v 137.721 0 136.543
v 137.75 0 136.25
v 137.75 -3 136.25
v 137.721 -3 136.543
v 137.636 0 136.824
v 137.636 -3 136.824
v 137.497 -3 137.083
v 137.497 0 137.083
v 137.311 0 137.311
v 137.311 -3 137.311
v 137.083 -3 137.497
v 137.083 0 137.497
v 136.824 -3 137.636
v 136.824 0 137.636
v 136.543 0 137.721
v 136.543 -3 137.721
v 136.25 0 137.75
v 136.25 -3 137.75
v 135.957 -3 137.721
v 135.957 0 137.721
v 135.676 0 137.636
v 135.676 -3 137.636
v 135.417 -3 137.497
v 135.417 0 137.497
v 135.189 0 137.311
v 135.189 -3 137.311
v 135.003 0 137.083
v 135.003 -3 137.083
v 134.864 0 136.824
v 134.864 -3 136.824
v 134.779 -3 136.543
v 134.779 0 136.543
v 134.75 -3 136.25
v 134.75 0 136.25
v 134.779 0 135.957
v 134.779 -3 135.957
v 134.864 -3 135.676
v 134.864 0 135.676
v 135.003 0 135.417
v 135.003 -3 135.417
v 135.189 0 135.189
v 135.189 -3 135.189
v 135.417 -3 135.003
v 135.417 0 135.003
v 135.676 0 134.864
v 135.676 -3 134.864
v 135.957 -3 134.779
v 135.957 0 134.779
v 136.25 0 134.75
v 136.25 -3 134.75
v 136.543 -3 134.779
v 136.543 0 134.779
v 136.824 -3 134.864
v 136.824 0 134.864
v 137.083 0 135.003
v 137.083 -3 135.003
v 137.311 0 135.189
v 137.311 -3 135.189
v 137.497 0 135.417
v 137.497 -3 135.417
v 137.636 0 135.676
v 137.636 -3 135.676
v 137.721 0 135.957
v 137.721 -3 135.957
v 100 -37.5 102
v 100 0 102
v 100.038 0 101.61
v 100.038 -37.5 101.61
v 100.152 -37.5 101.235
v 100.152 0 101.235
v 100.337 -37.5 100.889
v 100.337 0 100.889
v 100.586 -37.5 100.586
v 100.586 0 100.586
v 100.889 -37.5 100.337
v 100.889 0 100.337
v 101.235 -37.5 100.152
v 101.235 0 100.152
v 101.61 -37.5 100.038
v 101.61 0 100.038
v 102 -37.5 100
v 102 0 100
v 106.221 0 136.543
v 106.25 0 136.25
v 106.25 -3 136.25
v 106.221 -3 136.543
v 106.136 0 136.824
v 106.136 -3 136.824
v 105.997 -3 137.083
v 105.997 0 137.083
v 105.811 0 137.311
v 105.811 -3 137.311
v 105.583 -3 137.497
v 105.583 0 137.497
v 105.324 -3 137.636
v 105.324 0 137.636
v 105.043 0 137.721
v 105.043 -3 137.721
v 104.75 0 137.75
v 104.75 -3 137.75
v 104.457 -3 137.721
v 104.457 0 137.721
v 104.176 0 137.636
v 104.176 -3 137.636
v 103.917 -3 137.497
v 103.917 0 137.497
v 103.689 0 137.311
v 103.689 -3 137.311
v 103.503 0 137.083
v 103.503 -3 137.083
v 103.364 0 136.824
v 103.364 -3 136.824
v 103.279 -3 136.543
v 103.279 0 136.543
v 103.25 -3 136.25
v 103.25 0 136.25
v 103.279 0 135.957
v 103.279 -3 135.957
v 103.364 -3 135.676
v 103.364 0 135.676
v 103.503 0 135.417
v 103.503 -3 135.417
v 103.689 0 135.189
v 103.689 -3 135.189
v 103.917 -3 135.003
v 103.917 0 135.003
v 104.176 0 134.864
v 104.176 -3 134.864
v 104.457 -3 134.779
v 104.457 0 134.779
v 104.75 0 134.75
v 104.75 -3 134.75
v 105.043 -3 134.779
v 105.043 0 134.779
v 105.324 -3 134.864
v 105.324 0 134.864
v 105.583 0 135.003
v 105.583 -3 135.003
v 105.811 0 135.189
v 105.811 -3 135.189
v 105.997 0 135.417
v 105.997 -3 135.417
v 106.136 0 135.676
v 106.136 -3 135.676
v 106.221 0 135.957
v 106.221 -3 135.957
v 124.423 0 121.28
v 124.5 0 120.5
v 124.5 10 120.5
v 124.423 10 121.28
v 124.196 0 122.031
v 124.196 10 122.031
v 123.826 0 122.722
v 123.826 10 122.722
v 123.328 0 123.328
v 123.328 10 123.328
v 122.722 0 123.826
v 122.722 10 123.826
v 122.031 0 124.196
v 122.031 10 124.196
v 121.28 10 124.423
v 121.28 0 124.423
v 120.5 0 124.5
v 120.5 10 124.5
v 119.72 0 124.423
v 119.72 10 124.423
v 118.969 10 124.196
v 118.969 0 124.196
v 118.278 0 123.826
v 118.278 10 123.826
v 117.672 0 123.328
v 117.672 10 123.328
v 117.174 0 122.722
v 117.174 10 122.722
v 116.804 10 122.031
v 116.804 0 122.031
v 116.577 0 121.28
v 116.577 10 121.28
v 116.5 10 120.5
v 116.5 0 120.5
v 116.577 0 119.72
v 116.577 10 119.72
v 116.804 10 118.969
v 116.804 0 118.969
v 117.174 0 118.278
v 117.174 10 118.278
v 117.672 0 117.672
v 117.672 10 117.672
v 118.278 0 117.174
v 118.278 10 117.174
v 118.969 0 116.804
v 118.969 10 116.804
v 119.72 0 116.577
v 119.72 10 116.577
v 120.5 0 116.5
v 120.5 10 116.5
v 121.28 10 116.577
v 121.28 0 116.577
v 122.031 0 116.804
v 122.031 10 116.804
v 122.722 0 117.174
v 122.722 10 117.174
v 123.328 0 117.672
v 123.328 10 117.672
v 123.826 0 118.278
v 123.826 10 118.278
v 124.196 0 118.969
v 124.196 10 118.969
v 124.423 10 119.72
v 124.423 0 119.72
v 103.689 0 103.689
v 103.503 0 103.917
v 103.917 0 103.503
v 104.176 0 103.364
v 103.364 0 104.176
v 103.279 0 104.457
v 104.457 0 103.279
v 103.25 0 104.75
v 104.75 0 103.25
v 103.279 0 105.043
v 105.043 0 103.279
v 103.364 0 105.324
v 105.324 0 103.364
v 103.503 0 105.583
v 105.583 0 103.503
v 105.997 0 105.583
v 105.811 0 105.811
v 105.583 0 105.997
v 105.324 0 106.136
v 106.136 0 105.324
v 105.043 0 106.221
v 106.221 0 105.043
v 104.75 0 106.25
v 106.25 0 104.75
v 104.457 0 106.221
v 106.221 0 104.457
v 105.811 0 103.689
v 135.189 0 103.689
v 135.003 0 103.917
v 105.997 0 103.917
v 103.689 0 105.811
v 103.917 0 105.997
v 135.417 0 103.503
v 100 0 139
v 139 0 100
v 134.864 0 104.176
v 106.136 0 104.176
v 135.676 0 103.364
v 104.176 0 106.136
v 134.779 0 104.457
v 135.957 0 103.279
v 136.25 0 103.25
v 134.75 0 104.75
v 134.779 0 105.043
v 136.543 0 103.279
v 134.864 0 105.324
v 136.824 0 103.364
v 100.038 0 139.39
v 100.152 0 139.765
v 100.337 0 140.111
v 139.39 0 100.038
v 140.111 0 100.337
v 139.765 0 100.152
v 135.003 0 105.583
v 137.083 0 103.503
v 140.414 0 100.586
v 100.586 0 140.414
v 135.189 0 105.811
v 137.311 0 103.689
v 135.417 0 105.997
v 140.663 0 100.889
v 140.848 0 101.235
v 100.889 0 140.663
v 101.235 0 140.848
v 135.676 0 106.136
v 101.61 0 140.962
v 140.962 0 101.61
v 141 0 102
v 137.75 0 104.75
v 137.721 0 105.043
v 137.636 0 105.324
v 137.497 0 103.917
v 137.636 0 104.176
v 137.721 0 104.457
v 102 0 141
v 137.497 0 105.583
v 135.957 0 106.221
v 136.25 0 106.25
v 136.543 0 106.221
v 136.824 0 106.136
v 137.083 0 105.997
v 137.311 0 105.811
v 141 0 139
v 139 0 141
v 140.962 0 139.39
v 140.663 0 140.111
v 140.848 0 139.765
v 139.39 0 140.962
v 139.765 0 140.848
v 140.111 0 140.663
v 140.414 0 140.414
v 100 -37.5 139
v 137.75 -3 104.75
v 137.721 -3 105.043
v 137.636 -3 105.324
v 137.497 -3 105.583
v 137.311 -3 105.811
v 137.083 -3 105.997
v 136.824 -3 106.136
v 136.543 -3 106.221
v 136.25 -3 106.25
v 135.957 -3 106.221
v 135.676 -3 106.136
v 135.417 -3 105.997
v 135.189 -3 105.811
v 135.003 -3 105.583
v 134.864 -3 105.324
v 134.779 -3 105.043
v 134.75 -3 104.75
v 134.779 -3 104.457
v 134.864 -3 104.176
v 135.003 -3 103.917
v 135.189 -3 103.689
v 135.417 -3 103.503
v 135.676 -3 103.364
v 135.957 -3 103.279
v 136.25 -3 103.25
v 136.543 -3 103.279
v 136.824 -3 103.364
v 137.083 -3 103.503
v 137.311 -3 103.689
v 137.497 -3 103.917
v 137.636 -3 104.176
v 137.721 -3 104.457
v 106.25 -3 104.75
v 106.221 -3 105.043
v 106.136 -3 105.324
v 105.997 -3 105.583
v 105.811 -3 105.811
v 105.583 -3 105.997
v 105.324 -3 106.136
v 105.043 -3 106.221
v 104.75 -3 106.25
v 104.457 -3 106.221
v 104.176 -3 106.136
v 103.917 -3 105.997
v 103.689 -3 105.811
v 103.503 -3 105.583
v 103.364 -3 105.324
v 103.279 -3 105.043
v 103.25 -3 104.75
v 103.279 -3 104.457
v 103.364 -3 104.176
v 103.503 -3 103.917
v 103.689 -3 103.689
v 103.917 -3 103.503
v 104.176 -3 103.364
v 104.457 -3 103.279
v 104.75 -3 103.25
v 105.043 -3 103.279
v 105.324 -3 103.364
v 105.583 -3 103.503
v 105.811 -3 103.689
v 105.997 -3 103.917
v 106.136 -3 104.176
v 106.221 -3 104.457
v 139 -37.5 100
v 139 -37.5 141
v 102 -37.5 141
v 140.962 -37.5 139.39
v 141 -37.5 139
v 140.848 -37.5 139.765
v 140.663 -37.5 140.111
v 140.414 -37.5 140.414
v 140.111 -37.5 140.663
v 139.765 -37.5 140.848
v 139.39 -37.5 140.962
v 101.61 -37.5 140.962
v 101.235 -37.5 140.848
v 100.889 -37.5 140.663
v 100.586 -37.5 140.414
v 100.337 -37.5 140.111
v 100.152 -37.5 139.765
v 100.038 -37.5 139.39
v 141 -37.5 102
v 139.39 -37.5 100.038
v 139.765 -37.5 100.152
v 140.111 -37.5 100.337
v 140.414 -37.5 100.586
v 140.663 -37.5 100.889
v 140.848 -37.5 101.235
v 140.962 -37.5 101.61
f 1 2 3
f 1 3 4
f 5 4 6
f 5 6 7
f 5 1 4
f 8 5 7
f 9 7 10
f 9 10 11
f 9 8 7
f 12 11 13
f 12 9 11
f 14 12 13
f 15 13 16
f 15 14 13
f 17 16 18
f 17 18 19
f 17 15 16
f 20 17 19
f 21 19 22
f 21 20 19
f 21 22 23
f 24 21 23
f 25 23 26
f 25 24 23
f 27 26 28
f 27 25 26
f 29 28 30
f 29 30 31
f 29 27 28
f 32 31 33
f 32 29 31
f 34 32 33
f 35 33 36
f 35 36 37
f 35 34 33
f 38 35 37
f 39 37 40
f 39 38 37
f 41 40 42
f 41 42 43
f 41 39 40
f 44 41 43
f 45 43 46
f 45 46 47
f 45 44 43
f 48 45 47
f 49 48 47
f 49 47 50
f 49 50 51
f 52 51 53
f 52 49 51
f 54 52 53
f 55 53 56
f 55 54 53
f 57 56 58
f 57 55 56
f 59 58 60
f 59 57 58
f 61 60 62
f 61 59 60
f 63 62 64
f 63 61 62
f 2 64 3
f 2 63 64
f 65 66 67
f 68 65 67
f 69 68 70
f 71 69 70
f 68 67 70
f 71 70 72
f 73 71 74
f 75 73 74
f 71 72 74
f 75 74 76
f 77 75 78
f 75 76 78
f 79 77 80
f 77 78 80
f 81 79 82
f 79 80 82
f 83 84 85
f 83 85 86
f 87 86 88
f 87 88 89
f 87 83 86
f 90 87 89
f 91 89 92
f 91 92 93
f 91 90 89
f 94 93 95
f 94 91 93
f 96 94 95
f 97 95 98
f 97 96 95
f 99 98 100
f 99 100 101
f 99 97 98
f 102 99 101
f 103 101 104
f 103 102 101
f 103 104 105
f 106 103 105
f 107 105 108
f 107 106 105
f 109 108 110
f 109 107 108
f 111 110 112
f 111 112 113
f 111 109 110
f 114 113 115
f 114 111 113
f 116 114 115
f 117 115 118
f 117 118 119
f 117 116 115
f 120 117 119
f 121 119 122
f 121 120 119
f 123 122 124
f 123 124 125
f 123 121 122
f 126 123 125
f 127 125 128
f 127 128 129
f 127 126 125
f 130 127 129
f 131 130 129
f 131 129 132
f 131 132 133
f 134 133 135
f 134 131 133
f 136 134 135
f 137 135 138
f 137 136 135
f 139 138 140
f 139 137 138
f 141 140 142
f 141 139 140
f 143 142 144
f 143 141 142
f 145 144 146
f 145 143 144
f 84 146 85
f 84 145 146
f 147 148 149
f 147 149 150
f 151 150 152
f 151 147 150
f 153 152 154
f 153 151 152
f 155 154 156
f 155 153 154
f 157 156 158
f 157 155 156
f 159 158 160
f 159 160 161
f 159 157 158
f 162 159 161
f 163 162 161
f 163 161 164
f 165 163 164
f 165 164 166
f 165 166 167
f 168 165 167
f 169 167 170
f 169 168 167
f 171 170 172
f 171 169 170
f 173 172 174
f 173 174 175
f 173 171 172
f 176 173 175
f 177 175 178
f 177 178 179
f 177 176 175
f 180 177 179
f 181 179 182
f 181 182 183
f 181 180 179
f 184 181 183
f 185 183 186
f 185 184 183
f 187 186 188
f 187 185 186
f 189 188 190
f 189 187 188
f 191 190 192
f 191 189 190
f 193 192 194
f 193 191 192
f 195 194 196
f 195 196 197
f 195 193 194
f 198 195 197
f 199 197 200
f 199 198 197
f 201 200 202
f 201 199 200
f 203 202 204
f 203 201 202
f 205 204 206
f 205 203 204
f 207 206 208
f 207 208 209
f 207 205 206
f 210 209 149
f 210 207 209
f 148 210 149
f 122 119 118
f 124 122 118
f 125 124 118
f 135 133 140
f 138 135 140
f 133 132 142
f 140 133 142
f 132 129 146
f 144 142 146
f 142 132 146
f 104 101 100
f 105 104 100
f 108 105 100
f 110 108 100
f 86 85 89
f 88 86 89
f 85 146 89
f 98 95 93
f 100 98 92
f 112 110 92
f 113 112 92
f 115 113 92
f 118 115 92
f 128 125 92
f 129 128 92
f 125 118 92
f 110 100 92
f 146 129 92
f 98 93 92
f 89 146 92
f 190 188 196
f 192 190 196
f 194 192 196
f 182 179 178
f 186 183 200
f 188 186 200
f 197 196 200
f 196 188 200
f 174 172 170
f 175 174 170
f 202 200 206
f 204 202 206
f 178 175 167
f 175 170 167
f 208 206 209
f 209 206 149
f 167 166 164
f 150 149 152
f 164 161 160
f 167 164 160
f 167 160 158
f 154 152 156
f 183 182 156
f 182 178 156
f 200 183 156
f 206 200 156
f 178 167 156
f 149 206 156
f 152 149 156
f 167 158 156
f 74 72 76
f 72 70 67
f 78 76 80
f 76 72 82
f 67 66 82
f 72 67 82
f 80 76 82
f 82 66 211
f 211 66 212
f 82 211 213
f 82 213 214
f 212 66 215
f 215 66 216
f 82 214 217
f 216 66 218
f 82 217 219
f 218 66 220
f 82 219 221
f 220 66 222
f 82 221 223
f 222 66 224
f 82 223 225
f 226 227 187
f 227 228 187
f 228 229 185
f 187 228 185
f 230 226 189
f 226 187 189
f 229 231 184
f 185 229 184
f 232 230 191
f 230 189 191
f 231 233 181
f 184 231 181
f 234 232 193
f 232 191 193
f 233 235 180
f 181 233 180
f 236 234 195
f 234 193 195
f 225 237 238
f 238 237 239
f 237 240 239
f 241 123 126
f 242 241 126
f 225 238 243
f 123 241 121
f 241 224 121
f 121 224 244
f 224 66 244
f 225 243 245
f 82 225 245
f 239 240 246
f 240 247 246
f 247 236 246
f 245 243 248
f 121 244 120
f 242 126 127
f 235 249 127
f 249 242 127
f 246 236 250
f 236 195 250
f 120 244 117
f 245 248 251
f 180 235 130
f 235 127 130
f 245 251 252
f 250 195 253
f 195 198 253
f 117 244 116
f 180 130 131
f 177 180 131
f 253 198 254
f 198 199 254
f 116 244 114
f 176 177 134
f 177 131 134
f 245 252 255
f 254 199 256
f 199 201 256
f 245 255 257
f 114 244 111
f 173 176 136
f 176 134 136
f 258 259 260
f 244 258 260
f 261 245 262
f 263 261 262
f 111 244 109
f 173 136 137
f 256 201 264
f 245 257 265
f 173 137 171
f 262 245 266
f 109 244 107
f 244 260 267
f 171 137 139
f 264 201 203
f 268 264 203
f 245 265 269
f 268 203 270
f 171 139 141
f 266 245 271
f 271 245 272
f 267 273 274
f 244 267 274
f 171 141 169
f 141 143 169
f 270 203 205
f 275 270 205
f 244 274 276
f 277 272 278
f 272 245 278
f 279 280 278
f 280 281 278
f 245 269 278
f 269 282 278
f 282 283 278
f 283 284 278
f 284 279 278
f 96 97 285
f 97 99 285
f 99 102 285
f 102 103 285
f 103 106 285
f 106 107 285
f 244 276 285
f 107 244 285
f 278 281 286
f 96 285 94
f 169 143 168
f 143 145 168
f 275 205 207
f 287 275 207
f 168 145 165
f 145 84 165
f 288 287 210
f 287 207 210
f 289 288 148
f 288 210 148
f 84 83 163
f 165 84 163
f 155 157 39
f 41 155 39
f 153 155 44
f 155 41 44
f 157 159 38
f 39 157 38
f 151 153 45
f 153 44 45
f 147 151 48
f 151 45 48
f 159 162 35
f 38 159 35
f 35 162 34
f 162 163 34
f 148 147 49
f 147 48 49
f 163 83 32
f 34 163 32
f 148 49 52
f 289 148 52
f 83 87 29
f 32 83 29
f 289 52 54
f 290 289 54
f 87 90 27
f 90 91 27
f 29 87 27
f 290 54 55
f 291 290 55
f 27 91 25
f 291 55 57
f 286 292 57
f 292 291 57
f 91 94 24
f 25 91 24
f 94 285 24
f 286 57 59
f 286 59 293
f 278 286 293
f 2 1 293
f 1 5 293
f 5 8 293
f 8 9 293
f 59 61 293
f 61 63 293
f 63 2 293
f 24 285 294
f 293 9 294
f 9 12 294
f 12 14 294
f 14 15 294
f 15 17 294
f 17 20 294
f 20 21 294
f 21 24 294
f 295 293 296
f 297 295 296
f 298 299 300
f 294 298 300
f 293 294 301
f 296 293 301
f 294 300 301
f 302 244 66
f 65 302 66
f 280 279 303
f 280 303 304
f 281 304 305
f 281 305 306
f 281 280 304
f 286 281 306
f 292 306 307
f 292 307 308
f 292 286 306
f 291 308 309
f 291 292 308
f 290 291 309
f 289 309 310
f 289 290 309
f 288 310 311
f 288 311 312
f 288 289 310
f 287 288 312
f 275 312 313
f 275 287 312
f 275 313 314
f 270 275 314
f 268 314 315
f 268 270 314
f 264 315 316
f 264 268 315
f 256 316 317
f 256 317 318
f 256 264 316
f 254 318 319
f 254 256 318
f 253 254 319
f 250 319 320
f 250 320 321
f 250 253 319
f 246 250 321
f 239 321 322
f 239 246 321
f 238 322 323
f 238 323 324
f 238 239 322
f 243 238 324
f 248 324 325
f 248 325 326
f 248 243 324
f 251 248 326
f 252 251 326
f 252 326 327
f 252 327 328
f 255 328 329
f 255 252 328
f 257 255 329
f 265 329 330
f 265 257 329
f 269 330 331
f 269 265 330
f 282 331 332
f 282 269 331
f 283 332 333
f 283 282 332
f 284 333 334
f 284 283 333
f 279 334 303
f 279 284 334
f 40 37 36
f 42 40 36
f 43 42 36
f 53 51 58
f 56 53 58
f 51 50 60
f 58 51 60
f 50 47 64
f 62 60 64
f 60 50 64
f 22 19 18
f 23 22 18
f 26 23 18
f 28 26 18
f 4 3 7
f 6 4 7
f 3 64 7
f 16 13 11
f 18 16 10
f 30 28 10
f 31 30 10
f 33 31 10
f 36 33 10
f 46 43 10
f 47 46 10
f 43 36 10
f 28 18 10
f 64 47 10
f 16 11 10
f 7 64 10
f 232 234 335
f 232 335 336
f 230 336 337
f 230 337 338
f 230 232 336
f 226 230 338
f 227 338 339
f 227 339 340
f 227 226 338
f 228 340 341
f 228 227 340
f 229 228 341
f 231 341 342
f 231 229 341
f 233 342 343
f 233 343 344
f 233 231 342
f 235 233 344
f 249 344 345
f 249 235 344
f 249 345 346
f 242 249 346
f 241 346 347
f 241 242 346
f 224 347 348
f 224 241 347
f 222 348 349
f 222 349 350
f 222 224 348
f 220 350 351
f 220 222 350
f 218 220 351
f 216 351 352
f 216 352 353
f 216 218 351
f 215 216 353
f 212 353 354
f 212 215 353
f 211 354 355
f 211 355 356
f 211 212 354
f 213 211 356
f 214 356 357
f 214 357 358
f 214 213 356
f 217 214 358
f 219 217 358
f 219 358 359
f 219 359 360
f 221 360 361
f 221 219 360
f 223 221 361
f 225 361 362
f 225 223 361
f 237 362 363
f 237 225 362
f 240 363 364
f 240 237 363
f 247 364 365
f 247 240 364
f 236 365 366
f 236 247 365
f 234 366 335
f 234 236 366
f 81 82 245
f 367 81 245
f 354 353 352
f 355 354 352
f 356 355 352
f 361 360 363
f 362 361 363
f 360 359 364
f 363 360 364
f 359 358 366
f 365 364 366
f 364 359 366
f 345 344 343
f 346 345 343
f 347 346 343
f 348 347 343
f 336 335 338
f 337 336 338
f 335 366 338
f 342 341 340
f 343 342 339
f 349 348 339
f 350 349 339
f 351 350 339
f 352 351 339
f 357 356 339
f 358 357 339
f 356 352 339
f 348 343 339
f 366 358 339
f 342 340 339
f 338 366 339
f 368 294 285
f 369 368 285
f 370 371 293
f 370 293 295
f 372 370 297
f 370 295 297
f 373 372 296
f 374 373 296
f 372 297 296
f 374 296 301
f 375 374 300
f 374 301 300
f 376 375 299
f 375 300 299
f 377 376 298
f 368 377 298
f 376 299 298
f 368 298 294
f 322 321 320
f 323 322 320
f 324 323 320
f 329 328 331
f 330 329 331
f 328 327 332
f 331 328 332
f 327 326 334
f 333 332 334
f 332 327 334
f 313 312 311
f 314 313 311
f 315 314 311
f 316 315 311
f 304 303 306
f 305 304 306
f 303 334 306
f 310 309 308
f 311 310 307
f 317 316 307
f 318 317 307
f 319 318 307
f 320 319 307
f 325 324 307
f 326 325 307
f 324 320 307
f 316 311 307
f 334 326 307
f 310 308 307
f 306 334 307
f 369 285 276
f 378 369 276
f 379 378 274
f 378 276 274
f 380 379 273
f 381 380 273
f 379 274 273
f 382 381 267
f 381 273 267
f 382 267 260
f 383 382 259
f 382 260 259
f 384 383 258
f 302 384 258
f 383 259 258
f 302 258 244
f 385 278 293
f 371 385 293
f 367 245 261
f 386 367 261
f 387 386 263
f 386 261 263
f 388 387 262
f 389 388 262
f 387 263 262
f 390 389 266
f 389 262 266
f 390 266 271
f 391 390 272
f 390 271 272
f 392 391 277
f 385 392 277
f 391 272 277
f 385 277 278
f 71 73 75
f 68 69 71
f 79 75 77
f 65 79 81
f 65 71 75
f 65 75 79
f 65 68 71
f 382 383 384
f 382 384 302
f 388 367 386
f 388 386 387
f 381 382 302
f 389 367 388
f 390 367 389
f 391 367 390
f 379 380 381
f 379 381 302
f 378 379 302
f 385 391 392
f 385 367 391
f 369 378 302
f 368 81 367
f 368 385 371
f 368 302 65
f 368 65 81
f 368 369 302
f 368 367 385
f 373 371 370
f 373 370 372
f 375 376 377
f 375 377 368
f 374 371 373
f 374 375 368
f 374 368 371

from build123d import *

# Parameters (mm, degrees)
F1_R     = 1.5
F1_R_2   = 4
F2_DEPTH = 37.5
F3_DEPTH = 3
F4_DEPTH = 10


with BuildPart() as f2:
    # F1 (on Front) → F2 (new body)
    with BuildSketch(Plane.XZ):
        with BuildLine():
            ThreePointArc((100, 102), (100.585786, 100.585786), (102, 100))
            Line((102, 100), (139, 100))
            ThreePointArc((139, 100), (140.414214, 100.585786), (141, 102))
            Line((141, 102), (141, 139))
            ThreePointArc((141, 139), (140.414214, 140.414214), (139, 141))
            Line((139, 141), (102, 141))
            ThreePointArc((102, 141), (100.585786, 140.414214), (100, 139))
            Line((100, 139), (100, 102))
        make_face()
        with Locations((104.75, 104.75)):
            Circle(F1_R, mode=Mode.SUBTRACT)
        with Locations((136.25, 104.75)):
            Circle(F1_R, mode=Mode.SUBTRACT)
        with Locations((104.75, 136.25)):
            Circle(F1_R, mode=Mode.SUBTRACT)
        with Locations((120.5, 120.5)):
            Circle(F1_R_2, mode=Mode.SUBTRACT)
        with Locations((136.25, 136.25)):
            Circle(F1_R, mode=Mode.SUBTRACT)
        with Locations((104.75, 136.25)):
            Circle(F1_R)
        with Locations((136.25, 136.25)):
            Circle(F1_R)
        with Locations((120.5, 120.5)):
            Circle(F1_R_2)
        with Locations((136.25, 104.75)):
            Circle(F1_R)
        with Locations((104.75, 104.75)):
            Circle(F1_R)
    extrude(amount=F2_DEPTH)

    # F1 (on Front) → F3 (cut)
    with BuildSketch(Plane.XZ):
        with Locations((136.25, 104.75)):
            Circle(F1_R)
        with Locations((104.75, 104.75)):
            Circle(F1_R)
        with Locations((136.25, 136.25)):
            Circle(F1_R)
        with Locations((104.75, 136.25)):
            Circle(F1_R)
    extrude(amount=F3_DEPTH, mode=Mode.SUBTRACT)

    # F1 (on Front) → F4 (join)
    with BuildSketch(Plane.XZ):
        with Locations((120.5, 120.5)):
            Circle(F1_R_2)
    extrude(amount=-F4_DEPTH)


solid = f2.part
